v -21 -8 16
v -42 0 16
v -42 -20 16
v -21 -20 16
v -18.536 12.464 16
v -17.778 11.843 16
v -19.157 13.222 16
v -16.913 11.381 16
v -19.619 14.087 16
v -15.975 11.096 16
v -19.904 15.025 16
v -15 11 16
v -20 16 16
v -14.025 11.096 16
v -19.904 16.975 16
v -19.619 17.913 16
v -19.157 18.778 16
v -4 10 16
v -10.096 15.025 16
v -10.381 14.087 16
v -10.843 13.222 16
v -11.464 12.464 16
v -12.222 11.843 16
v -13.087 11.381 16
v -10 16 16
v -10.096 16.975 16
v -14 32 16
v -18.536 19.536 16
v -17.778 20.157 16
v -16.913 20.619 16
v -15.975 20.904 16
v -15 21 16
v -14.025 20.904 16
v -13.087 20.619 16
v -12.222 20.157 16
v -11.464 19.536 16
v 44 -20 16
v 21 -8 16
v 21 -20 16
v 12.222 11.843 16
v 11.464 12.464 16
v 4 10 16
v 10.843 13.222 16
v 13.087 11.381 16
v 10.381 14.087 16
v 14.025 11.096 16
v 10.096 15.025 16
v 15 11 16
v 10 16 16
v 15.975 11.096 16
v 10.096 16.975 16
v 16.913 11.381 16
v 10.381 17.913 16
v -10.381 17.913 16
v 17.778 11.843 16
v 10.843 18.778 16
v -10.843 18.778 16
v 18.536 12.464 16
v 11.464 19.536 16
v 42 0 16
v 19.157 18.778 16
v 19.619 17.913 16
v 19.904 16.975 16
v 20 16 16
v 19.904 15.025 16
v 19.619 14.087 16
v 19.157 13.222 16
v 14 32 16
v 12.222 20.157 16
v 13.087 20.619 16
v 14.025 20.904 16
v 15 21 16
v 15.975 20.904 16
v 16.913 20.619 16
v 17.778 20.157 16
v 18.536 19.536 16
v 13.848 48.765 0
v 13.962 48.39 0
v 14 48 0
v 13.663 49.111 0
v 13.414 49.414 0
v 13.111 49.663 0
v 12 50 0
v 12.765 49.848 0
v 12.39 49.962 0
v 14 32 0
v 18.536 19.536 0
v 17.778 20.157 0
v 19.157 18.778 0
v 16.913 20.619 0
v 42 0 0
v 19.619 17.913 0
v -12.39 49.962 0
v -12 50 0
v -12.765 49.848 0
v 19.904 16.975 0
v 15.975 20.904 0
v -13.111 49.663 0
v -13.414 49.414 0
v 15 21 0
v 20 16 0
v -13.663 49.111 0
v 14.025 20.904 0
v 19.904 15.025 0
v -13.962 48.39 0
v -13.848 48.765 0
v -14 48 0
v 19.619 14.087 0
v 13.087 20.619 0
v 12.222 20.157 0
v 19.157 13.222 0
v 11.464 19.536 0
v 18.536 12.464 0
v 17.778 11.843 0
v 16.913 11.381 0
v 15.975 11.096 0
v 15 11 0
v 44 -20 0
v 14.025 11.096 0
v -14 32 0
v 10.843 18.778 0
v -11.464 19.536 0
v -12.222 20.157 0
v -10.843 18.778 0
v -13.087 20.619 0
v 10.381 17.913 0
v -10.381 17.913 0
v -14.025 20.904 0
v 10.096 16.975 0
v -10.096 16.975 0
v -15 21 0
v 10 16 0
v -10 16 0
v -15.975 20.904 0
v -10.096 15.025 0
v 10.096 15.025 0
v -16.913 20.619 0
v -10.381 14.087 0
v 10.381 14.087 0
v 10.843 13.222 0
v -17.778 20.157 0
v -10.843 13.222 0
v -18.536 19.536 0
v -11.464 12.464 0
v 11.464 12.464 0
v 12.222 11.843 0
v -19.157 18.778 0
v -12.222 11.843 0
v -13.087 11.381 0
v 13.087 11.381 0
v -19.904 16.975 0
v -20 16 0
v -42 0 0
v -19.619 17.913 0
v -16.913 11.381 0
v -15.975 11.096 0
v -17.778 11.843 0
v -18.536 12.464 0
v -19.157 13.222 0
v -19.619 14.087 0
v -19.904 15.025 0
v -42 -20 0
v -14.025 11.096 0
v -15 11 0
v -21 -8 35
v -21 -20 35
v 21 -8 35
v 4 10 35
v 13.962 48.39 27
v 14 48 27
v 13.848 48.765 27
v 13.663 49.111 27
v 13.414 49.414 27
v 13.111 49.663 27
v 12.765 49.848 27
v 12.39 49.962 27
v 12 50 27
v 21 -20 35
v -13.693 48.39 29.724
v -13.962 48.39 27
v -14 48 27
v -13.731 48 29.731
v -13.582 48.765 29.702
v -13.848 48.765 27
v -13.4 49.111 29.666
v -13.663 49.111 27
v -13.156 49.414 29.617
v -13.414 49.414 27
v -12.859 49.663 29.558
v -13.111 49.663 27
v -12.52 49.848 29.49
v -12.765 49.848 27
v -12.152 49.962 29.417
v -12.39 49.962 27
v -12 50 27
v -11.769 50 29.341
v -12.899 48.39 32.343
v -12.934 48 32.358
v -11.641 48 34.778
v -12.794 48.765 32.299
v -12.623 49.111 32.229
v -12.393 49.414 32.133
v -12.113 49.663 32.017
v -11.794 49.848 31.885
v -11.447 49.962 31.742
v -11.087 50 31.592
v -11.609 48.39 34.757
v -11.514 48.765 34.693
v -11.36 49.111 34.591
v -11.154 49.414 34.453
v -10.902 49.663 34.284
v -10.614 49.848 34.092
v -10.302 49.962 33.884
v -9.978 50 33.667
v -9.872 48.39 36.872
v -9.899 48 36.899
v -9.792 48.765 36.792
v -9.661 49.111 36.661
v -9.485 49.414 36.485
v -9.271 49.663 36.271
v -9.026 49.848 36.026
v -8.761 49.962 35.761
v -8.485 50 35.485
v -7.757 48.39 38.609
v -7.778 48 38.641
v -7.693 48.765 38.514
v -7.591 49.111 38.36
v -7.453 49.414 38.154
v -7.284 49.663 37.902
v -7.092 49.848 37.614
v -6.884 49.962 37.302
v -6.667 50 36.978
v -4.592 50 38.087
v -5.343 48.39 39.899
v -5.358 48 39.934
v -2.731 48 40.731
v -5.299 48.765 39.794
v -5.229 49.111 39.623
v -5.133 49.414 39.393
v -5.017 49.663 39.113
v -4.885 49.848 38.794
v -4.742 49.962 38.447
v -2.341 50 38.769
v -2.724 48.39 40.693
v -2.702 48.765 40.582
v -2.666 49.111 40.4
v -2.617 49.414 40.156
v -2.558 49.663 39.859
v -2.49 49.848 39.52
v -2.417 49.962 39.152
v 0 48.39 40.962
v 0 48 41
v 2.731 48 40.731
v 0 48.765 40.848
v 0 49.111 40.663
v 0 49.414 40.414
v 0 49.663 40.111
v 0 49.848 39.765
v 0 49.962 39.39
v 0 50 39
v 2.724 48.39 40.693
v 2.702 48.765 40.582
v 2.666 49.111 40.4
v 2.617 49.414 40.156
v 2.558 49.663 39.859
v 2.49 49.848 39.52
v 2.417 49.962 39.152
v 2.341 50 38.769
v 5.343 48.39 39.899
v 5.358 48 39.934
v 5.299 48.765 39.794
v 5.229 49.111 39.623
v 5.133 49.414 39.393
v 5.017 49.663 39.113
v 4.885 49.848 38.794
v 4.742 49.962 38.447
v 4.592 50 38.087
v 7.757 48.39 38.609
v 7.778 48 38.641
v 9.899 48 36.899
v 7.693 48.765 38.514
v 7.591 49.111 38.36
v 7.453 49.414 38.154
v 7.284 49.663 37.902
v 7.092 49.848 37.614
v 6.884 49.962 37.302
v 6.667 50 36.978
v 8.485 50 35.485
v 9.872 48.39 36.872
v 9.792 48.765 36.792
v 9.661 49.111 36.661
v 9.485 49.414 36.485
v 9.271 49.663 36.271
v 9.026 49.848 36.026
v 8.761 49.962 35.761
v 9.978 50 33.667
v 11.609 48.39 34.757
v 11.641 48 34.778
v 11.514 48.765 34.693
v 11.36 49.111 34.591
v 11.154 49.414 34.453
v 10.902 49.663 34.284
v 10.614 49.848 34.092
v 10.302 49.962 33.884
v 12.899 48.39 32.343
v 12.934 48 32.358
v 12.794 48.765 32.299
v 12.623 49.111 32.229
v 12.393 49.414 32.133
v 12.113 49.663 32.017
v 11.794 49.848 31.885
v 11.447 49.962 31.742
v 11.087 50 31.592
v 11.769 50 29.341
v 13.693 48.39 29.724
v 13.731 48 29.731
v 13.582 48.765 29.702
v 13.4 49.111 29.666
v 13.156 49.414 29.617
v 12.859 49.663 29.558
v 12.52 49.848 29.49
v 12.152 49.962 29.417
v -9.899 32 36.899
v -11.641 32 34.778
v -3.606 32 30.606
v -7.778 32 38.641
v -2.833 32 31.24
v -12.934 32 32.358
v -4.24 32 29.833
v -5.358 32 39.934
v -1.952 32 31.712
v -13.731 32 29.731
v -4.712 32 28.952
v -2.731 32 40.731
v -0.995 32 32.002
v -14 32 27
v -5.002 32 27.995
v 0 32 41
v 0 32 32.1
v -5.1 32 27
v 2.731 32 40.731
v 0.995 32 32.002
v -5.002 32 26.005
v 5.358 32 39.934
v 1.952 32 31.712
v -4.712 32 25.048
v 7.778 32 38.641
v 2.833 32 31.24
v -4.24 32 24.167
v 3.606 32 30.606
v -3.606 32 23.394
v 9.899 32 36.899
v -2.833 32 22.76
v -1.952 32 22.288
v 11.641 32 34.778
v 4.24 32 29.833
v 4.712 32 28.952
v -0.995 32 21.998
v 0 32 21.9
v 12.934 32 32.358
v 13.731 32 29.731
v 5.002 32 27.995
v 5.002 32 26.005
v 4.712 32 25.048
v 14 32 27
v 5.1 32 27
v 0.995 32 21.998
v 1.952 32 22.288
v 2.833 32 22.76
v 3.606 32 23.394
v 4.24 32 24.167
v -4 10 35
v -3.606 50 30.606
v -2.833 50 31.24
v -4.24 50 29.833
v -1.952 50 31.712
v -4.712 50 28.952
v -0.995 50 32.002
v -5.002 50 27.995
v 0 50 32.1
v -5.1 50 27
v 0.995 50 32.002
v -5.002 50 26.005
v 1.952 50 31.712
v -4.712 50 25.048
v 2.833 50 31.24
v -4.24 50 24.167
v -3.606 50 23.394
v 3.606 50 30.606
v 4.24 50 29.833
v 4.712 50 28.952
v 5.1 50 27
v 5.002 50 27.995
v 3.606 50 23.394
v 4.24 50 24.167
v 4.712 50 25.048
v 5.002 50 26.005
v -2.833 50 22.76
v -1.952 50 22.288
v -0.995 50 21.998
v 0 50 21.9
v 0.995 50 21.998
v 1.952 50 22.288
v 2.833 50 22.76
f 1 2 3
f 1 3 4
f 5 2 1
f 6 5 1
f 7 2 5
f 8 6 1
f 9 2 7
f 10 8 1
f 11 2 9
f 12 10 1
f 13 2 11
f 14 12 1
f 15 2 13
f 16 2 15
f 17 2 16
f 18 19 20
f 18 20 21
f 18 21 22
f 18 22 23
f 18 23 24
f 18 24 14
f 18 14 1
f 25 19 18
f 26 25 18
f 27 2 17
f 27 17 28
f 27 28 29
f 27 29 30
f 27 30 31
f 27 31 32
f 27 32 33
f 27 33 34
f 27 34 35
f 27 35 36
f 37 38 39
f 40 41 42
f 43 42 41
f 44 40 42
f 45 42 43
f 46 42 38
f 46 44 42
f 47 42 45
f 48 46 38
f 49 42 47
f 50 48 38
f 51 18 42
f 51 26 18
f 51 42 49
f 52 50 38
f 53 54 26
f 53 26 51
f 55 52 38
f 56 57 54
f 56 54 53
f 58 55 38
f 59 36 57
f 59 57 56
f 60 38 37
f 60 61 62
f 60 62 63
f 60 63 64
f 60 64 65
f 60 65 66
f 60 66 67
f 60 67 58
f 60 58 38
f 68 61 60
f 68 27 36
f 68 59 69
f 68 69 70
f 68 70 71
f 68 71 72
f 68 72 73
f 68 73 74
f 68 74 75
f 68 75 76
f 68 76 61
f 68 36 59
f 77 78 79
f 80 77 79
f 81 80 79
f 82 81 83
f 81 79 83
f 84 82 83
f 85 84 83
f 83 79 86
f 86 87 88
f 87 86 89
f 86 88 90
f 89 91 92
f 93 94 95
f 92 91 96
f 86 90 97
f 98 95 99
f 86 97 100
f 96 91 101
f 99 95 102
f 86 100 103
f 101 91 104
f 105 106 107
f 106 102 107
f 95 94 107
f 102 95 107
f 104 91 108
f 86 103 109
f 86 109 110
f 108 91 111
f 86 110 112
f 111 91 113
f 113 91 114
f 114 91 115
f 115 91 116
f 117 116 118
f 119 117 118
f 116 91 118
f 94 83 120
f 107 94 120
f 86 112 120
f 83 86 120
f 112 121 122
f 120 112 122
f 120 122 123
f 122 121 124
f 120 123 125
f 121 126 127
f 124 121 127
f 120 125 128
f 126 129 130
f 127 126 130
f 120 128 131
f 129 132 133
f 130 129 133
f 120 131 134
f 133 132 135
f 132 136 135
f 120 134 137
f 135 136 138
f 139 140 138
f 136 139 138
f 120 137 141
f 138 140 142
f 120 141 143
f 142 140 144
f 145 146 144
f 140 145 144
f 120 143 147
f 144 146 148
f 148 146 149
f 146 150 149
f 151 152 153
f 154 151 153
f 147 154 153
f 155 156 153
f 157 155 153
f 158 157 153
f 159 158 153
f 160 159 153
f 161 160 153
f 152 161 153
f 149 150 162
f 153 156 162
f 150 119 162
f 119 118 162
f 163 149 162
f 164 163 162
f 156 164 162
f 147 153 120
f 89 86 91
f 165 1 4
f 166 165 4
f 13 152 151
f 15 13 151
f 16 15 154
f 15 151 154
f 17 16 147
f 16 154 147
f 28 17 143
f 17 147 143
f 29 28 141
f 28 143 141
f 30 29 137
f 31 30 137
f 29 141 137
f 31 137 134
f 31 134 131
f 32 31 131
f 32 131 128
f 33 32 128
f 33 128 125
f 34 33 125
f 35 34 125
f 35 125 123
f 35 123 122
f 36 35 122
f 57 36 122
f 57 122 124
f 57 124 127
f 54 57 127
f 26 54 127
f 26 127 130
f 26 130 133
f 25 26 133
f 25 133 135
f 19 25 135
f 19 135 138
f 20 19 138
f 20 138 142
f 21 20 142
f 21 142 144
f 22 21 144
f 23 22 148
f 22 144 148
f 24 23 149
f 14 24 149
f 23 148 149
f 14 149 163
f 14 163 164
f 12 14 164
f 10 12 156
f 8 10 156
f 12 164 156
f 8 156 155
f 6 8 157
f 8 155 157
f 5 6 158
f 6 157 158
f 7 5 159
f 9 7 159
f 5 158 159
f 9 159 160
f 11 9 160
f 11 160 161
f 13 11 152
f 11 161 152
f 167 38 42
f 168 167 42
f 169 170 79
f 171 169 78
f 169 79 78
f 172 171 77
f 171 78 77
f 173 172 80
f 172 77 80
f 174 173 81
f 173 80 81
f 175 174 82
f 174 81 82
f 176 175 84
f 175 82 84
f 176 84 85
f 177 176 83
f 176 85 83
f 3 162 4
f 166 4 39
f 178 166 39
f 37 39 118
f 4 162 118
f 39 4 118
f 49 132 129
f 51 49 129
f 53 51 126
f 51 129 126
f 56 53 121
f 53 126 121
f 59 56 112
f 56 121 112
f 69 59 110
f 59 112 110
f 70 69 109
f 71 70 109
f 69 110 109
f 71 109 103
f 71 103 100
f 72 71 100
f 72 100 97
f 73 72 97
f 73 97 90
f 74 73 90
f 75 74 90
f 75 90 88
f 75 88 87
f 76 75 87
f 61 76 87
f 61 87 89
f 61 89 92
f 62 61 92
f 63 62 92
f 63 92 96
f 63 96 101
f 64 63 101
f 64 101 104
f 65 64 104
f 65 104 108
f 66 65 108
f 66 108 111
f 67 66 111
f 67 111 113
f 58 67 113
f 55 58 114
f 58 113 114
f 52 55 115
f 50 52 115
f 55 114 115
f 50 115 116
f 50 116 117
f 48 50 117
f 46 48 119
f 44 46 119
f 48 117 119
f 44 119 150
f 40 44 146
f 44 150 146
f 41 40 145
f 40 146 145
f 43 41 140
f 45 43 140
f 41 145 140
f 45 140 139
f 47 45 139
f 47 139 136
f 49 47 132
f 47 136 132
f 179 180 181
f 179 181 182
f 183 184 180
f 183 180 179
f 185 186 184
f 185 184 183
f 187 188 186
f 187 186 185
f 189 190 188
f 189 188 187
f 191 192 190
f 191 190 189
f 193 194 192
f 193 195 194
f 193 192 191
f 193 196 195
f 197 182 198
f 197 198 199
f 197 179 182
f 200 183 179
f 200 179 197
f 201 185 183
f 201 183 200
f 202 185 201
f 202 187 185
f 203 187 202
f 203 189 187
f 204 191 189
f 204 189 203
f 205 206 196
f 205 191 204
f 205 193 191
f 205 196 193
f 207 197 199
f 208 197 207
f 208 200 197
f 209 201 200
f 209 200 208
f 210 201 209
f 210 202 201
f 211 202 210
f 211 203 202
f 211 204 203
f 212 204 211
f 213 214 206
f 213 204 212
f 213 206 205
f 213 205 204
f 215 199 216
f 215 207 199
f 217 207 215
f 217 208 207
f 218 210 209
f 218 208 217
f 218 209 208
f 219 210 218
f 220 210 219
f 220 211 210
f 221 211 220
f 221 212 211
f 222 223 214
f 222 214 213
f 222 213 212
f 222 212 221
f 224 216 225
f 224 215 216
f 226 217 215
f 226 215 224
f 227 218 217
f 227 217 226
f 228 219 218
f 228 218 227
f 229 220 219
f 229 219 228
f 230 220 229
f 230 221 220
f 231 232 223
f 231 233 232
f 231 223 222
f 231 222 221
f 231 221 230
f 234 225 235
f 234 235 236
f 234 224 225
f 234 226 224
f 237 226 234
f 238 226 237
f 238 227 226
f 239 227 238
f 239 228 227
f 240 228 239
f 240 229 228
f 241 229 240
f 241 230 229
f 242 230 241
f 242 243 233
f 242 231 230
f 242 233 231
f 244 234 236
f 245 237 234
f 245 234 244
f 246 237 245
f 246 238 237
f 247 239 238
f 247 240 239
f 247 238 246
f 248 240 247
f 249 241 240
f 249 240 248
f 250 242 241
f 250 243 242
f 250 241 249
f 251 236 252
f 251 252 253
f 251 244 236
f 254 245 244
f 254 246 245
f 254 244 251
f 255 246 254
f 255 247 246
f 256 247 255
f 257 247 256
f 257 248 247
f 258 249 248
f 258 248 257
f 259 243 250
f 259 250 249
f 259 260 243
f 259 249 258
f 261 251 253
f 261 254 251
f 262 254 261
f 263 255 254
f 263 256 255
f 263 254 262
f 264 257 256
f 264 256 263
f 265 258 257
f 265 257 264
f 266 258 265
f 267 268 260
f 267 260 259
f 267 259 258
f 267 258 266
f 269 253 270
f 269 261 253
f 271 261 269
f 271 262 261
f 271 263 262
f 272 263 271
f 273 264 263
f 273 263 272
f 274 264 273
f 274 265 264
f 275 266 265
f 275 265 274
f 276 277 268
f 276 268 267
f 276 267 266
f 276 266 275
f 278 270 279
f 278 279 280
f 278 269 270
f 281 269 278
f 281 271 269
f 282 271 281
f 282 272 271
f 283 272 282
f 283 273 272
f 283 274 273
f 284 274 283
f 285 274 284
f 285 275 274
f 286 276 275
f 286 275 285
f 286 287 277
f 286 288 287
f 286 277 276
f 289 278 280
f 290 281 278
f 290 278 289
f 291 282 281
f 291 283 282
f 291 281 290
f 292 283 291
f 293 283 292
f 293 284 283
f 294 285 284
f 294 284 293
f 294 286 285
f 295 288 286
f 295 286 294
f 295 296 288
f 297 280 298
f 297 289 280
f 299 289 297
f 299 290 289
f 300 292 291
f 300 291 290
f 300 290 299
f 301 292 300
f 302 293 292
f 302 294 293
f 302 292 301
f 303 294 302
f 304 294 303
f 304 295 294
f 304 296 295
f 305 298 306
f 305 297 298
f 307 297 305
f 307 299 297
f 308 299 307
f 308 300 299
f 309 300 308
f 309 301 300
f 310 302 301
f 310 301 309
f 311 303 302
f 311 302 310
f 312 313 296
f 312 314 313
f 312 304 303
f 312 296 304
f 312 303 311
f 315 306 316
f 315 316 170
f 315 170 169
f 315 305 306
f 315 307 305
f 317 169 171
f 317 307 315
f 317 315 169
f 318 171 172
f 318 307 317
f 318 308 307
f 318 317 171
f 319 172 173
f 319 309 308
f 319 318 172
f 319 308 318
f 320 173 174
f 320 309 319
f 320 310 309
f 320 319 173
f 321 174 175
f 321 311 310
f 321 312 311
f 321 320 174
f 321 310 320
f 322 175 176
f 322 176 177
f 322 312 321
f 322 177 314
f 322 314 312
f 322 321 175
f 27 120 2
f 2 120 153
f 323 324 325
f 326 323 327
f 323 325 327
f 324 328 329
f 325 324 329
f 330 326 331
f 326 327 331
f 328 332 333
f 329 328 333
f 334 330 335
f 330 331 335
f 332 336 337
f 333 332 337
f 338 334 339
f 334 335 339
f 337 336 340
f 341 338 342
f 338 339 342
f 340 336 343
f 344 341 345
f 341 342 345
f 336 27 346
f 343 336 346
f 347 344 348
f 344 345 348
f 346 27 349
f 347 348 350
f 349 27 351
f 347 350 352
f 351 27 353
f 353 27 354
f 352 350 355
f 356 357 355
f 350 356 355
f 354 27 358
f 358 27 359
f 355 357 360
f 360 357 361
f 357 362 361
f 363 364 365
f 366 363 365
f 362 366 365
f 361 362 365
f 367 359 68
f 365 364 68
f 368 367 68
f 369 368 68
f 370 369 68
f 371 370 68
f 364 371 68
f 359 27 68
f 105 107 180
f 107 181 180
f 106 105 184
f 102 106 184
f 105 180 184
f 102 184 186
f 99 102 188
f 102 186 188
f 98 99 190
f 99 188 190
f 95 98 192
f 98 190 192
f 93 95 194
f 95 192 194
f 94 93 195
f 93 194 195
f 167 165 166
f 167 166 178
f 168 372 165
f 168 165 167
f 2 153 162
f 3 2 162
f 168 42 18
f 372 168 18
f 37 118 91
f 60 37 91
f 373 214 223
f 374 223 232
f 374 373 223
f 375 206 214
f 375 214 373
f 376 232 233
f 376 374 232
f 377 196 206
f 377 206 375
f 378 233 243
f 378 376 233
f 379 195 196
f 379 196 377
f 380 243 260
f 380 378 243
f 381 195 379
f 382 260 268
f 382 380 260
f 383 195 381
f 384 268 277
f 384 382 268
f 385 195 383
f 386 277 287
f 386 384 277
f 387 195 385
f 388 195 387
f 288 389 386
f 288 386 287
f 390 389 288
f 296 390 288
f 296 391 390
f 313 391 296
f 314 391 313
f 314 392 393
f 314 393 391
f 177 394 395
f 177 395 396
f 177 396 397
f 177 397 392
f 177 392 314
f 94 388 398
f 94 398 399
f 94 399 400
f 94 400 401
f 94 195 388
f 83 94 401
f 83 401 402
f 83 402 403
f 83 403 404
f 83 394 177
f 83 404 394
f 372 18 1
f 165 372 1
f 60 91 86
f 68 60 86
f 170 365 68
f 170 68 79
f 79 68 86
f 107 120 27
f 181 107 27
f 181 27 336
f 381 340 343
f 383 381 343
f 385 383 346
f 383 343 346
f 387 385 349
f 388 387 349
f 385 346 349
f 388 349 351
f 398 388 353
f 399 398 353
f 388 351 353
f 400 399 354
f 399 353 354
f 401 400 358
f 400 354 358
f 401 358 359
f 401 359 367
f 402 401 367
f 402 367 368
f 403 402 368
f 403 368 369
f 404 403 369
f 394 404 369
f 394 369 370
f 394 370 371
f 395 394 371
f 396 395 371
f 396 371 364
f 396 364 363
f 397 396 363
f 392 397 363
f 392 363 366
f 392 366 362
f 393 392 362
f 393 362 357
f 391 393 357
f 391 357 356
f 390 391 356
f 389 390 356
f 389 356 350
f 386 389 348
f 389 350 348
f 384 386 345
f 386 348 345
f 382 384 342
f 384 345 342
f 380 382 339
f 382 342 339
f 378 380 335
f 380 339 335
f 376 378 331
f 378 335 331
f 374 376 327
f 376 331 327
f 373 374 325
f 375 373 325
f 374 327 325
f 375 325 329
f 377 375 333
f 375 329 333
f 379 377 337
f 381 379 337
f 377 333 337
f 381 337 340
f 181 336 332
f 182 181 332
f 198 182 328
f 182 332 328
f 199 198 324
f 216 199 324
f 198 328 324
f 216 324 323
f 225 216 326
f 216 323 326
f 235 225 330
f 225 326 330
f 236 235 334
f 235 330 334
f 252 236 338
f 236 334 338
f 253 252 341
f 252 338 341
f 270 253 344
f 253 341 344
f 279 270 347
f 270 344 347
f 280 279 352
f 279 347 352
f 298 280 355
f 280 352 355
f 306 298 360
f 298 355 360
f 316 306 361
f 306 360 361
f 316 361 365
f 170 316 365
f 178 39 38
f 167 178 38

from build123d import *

# Parameters (mm, degrees)
EXTRUDE_1_DEPTH         = 16
EXTRUDE_2_DEPTH         = 19
EXTRUDE_3_DEPTH         = 18
FILLET_1_R              = 2
HOLE_WIZARD_M12_1_D     = 10.2
HOLE_WIZARD_M12_1_DEPTH = 18
HOLE_WIZARD_10_0_10_1_D = 10


with BuildPart() as part:
    # 草图1 → 凸台-拉伸1 (new body)
    with BuildSketch(Plane.XY):
        Polygon((14, 32), (-14, 32), (-42, 0), (-42, -20), (44, -20), (42, 0), align=None)
    extrude(amount=EXTRUDE_1_DEPTH)

    # 草图2 → 凸台-拉伸2 (add)
    with BuildSketch(Plane.XY.offset(16)):
        Polygon((4, 10), (-4, 10), (-21, -8), (-21, -20), (21, -20), (21, -8), align=None)
    extrude(amount=EXTRUDE_2_DEPTH)

    # 草图5 → 凸台-拉伸3 (add)
    with BuildSketch(Plane(origin=(0, 32, 0), x_dir=(1, 0, 0), z_dir=(0, 1, 0))):
        with BuildLine():
            Line((-14, 0), (-14, -27))
            ThreePointArc((-14, -27), (0, -41), (14, -27))
            Line((14, -27), (14, 0))
            Line((14, 0), (-14, 0))
        make_face()
    extrude(amount=EXTRUDE_3_DEPTH)

    # 圆角1
    fillet_1_edges = [part.edges().sort_by_distance(p)[0] for p in [
        (0, 50, 41),
        (14, 50, 13.5),
        (-14, 50, 13.5),
    ]]
    fillet(fillet_1_edges, radius=FILLET_1_R)

    # M12 螺纹孔1
    with Locations(Plane(origin=(0, 50, 0), x_dir=(1, 0, 0), z_dir=(0, 1, 0))):
        with Locations((0, -27)):
            Hole(HOLE_WIZARD_M12_1_D / 2, depth=HOLE_WIZARD_M12_1_DEPTH)

    # Ø10.0 (10) 直径孔1 (through all)
    with Locations(Plane.XY.offset(16)):
        with Locations((-15, 16), (15, 16)):
            Hole(HOLE_WIZARD_10_0_10_1_D / 2)


solid = part.part
